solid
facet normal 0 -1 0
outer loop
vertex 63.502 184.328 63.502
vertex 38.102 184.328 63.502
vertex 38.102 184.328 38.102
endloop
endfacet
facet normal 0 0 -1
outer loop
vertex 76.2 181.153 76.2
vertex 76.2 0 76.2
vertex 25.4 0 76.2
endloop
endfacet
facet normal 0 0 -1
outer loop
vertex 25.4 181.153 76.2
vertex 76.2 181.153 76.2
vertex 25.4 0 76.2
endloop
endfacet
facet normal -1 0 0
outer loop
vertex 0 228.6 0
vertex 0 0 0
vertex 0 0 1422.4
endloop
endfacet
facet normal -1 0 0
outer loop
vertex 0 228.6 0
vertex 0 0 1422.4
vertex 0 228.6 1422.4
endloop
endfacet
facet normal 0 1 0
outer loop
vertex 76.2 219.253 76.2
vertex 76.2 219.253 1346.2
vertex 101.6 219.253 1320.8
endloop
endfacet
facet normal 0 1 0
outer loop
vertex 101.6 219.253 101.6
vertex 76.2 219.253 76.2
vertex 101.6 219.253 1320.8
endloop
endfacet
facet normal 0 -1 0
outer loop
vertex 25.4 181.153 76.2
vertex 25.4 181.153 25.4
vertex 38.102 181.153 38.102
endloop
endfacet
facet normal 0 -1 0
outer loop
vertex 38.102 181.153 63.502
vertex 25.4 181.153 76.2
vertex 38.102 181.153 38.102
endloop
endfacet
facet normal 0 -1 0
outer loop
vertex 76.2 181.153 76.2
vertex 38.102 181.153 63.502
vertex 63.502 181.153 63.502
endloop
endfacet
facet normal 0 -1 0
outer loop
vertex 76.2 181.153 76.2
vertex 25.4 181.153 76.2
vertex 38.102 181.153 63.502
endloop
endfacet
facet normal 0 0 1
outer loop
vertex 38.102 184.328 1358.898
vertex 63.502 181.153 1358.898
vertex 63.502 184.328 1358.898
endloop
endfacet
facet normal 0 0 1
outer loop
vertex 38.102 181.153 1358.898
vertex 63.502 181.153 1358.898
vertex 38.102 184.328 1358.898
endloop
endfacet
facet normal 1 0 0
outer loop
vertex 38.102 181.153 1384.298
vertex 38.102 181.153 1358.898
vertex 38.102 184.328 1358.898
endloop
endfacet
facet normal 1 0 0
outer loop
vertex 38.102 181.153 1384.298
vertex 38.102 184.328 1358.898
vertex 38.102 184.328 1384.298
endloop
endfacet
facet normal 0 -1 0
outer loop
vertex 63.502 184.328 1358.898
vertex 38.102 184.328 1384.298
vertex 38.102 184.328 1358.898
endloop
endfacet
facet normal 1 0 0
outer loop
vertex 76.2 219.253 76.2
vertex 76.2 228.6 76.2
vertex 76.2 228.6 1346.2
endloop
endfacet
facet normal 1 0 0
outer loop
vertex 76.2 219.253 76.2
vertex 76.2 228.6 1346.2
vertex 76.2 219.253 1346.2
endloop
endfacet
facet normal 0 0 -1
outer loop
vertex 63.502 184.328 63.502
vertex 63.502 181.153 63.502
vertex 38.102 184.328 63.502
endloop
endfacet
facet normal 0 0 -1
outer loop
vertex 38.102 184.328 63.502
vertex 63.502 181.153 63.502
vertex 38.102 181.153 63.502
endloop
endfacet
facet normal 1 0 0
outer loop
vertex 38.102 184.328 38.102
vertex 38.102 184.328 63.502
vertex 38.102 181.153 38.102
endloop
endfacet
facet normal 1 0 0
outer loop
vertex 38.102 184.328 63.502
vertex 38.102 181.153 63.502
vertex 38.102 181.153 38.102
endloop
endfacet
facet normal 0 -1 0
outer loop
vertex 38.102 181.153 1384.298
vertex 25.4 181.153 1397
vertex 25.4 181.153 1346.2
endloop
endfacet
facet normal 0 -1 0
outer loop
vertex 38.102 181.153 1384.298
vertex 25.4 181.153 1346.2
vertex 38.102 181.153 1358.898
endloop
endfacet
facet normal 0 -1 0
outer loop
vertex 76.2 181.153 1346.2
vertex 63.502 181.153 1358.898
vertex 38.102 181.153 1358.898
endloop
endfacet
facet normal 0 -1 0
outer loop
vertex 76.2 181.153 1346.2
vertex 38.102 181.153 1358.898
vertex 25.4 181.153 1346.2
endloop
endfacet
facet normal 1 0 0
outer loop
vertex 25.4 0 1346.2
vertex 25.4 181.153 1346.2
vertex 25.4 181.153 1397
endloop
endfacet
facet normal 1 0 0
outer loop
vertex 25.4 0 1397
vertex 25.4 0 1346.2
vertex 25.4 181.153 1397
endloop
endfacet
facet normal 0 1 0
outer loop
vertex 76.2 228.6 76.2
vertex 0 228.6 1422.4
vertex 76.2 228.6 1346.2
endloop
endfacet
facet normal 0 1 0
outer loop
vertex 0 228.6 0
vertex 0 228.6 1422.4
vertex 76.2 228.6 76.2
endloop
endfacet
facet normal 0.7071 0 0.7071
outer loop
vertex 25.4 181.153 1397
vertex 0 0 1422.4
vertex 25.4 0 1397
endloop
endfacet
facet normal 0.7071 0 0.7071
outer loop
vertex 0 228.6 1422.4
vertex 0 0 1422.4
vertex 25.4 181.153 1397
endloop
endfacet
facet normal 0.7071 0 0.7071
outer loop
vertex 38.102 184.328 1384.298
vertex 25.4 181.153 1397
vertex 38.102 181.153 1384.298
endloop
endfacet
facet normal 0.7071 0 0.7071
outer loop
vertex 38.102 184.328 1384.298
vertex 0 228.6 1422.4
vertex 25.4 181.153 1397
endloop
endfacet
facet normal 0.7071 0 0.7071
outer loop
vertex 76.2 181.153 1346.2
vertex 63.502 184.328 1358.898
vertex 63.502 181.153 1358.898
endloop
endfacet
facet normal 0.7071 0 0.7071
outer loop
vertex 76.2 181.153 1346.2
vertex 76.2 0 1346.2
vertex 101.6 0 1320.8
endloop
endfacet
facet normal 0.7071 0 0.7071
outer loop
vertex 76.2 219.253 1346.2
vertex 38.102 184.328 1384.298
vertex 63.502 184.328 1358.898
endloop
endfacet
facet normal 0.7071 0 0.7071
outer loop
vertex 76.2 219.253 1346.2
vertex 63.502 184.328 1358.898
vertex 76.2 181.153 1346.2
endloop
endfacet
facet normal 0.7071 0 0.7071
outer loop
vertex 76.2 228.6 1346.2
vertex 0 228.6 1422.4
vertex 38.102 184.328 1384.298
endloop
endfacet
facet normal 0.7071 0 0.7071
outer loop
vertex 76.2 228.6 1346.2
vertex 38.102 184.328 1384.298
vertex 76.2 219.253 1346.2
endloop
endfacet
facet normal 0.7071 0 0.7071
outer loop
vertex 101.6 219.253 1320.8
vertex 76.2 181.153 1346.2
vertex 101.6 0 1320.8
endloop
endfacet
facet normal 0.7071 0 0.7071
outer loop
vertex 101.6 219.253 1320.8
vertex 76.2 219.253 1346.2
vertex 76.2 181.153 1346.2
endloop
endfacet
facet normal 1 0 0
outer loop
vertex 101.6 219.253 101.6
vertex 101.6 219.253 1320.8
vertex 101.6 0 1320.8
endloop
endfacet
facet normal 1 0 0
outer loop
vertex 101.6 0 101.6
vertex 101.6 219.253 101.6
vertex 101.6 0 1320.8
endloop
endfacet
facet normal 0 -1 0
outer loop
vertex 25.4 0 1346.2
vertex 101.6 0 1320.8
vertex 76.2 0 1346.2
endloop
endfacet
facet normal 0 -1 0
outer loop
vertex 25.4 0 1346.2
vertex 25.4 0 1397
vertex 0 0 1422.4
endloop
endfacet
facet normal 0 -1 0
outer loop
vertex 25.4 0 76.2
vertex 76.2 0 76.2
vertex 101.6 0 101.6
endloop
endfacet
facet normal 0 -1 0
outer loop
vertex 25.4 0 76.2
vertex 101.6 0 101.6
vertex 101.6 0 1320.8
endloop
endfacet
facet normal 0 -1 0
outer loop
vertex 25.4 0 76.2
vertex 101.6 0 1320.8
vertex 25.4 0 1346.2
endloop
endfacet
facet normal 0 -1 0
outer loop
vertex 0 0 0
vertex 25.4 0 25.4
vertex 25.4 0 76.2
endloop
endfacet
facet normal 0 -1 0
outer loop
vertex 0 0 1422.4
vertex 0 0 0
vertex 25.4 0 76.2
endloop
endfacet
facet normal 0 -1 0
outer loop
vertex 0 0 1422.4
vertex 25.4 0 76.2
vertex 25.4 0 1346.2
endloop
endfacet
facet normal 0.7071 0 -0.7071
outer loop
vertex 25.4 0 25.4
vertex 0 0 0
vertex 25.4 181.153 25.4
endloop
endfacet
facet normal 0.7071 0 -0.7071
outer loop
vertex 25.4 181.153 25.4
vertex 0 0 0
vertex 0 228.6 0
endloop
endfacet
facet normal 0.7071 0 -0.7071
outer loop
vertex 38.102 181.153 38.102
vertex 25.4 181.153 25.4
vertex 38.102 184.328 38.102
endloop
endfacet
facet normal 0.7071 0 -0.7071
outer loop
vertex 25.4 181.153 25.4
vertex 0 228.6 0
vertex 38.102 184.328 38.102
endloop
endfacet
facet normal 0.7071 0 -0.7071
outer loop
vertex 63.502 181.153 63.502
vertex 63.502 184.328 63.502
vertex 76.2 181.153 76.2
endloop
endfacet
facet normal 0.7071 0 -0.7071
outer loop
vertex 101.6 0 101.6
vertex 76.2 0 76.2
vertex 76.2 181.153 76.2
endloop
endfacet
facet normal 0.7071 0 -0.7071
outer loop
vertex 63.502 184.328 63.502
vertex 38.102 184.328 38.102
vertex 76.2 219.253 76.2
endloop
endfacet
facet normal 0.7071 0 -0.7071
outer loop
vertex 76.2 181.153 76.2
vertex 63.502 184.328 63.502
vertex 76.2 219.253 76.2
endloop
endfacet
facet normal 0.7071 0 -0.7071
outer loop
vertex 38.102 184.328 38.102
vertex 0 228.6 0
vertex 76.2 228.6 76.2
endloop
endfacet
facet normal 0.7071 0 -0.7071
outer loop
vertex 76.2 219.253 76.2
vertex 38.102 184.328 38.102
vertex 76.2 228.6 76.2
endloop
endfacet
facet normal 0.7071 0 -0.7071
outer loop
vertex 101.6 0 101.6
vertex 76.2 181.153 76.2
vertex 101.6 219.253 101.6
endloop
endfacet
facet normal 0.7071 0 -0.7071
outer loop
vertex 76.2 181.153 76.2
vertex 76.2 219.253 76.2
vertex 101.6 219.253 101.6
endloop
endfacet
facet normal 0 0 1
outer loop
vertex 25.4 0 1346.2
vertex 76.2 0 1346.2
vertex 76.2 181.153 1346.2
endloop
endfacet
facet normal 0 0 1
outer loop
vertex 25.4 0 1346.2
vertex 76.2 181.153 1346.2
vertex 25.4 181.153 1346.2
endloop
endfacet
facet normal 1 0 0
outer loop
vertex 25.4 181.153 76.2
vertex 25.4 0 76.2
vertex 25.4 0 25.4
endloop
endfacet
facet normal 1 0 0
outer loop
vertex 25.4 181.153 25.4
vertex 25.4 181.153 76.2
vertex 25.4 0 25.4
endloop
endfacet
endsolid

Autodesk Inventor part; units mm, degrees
ref_plane "YZ Plane" through (0, 0, 0) normal (1, 0, 0) x (0, 1, 0)
ref_plane "XZ Plane" through (0, 0, 0) normal (0, 1, 0) x (-1, 0, 0)
sketch "Sketch1" plane through (0, 0, 0) normal (0, 0, 1) x (1, 0, 0)
  line L0 (0, 0) -> (0, 228.6)
  line L1 (0, 228.6) -> (76.2, 228.6)
  line L2 (76.2, 228.6) -> (76.2, 219.2528)
  line L3 (76.2, 219.2528) -> (101.6, 219.2528)
  line L4 (101.6, 219.2528) -> (101.6, 0)
  line L5 (101.6, 0) -> (0, 0)
  dimension "d0" = 228.6
  dimension "d1" = 76.2
  dimension "d2" = 9.3472
  dimension "d3" = 25.4
extrude "Extrusion1" add sketch "Sketch1" along normal blind 1422.4
ref_plane "Work Plane2" through (25.4038, 0, 736.5962) normal (0, -1, 0) x (1, 0, 0)
sketch "Sketch7" plane through (25.4038, 0, 736.5962) normal (0, -1, 0) x (1, 0, 0)
  line L0 (76.1962, -634.9962) -> (50.7962, -660.3962)
  line L1 (50.7962, -660.3962) -> (-0.0038, -660.3962)
  line L2 (76.1962, -634.9962) -> (-25.4038, -736.5962) projected
  line L3 (76.1962, -736.5962) -> (76.1962, 584.2038) projected
  line L4 (-0.0038, -660.3962) -> (-0.0038, -711.1962)
  line L5 (-0.0038, -711.1962) -> (50.7962, -660.3962)
  dimension "d39" = 50.8
  dimension "d41" = 90
  dimension "d42" = 50.8
extrude "Extrusion5" cut sketch "Sketch7" against normal blind 181.1528
sketch "Sketch8" plane through (25.4, 0, 76.2) normal (0, -1, 0) x (1, 0, 0)
  line L0 (76.2, -76.2) -> (76.2, 1346.2) projected
  line L1 (76.2, 1244.6) -> (50.8, 1270)
  line L2 (50.8, 1270) -> (0, 1270)
  line L3 (0, 1270) -> (0, 1320.8)
  line L4 (0, 1320.8) -> (50.8, 1270)
  line L5 (-25.4, 1346.2) -> (76.2, 1244.6) projected
  point P0 (-25.4, -76.2)
  point P1 (76.2, 25.4)
  dimension "d48" = 90
  dimension "d49" = 50.8
extrude "Extrusion6" cut sketch "Sketch8" against normal blind 181.1528
chamfer "Chamfer6" distance 101.6 angle 45 1 edges at (101.6, 109.6264, 1422.4)
chamfer "Chamfer7" distance 101.6 angle 45 1 edges at (101.6, 109.6264, 0)
sketch "Sketch9" plane through (25.4, 181.1528, 76.2) normal (0, -1, 0) x (1, 0, 0)
  line L0 (32.8422, -17.9578) -> (7.4422, -17.9578)
  line L1 (7.4422, -17.9578) -> (7.4422, -43.3578)
  line L2 (32.8422, -17.9578) -> (7.4422, -43.3578)
  line L3 (-25.4, -76.2) -> (50.8, 0) projected
  line L4 (50.8, 0) -> (38.1019, -12.6981)
  line L5 (50.8, 1270) -> (76.2, 1244.6) projected
  line L6 (50.8, 1270) -> (38.1019, 1282.6981)
  line L7 (0, 1320.8) -> (50.8, 1270) projected
  line L8 (38.1019, 1282.6981) -> (12.7019, 1282.6981)
  line L9 (12.7019, 1282.6981) -> (12.7019, 1308.0981)
  line L10 (38.1019, 1282.6981) -> (12.7019, 1308.0981)
  dimension "d63" = 0
  dimension "d64" = 25.4
  dimension "d65" = 17.9578
  dimension "d66" = 17.9578
  dimension "d67" = 25.4
extrude "Extrusion7" cut sketch "Sketch9" against normal blind 3.175 contours L7 L8 L9
sketch "Sketch10" plane through (25.4038, 181.1528, 736.5962) normal (0, -1, 0) x (1, 0, 0)
  line L0 (76.1962, -634.9962) -> (50.7962, -660.3962) projected
  line L1 (50.7962, -660.3962) -> (38.0981, -673.0942)
  line L2 (38.0981, -673.0942) -> (12.6981, -673.0942)
  line L3 (12.6981, -673.0942) -> (12.6981, -698.4942)
  line L4 (38.0981, -673.0942) -> (12.6981, -698.4942)
  point P0 (-25.4038, -736.5962)
  dimension "d70" = 17.9578
  dimension "d71" = 25.4
  dimension "d72" = 25.4
extrude "Extrusion8" cut sketch "Sketch10" against normal blind 3.175
properties part number "SideLength" material "Wood (Birch)"
